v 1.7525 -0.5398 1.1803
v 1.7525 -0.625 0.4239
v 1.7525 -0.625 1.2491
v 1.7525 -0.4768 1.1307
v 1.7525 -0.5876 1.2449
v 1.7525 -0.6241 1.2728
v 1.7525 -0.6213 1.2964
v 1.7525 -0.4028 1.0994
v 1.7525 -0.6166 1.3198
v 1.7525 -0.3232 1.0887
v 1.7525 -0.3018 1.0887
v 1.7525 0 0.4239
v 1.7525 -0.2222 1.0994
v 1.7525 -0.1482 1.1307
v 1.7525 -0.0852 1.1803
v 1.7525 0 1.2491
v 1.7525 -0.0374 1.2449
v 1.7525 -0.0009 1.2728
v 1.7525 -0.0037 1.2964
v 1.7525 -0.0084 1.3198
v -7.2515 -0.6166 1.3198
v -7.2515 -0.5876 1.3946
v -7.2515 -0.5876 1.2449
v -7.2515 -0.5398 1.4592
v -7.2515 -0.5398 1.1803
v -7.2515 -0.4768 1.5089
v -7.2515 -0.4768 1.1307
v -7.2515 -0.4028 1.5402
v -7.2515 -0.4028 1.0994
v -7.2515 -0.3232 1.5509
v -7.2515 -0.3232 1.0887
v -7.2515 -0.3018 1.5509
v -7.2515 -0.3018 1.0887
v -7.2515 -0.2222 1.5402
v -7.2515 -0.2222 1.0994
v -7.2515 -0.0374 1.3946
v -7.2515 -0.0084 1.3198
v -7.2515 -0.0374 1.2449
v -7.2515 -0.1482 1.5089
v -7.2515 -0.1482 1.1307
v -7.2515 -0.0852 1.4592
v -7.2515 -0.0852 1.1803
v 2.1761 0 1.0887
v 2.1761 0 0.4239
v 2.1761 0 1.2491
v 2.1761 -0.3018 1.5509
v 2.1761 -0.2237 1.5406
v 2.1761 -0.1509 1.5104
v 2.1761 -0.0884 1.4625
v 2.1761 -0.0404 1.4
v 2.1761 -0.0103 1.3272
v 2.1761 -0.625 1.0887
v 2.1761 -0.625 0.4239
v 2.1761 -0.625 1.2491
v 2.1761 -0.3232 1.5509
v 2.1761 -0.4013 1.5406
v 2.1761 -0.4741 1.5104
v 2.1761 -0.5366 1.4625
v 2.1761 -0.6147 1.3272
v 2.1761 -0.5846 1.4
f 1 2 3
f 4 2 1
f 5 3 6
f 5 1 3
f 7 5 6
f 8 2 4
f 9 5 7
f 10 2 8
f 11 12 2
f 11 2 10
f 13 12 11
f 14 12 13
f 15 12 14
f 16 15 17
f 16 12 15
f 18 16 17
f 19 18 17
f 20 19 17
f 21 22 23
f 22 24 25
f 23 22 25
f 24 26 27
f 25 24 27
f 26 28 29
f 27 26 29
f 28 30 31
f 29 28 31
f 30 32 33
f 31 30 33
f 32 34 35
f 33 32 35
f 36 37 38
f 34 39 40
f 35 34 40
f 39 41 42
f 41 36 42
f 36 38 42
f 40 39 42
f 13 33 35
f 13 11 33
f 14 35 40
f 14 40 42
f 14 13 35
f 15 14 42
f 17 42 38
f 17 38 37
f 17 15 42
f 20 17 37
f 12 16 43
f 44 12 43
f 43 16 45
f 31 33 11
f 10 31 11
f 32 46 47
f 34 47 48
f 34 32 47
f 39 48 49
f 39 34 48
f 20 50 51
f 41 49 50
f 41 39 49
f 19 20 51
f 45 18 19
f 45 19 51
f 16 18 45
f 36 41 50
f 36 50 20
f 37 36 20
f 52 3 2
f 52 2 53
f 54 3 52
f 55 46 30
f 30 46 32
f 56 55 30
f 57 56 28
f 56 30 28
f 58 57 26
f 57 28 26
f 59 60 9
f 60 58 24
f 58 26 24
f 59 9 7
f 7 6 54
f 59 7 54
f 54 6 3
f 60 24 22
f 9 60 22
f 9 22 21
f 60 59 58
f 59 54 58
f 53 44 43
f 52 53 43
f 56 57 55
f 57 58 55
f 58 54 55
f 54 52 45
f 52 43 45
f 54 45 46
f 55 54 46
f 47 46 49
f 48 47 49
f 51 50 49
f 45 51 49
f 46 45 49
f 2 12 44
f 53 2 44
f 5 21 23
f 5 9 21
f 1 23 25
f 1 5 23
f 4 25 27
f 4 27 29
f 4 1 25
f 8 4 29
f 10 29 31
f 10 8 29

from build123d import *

# Parameters (mm, degrees)
F0_W     = 3.3884318545
F0_H     = 5.3184241988
F1_DEPTH = 5
F2_F1_R  = 2.4142135624
F2_F2_R  = 2.4142135624
F2_F3_R  = 2.4142135624
F2_F4_R  = 2.4142135624
F3_SCALE = 0.125


with BuildPart() as f1:
    # F0 (on Front) → F1 (new body)
    with BuildSketch(Plane.XZ):
        Polygon((17.4084361643, 12.4068003497), (-58.0119900405, 12.4068003497), (-58.0119900405, 8.7094834889), (14.0200043097, 8.7094834889), (17.4084361643, 8.7094834889), align=None)
        with Locations((15.714220237, 6.0502713895)):
            Rectangle(F0_W, F0_H)
    extrude(amount=F1_DEPTH)

    # F2: fillet of radius 2.4142135624 on 4 edges, made by hand

    # F2_f1
    f2_f1_edges = [f1.edges().sort_by_distance(p)[0] for p in [
        (-21.9959928654, 0, 8.7094834889),
    ]]
    fillet(f2_f1_edges, radius=F2_F1_R)

    # F2_f2
    f2_f2_edges = [f1.edges().sort_by_distance(p)[0] for p in [
        (-21.9959928654, -5, 8.7094834889),
    ]]
    fillet(f2_f2_edges, radius=F2_F2_R)

    # F2_f3
    f2_f3_edges = [f1.edges().sort_by_distance(p)[0] for p in [
        (-20.3017769381, 0, 12.4068003497),
    ]]
    fillet(f2_f3_edges, radius=F2_F3_R)

    # F2_f4
    f2_f4_edges = [f1.edges().sort_by_distance(p)[0] for p in [
        (-20.3017769381, -5, 12.4068003497),
    ]]
    fillet(f2_f4_edges, radius=F2_F4_R)


with BuildPart() as f1_1:
    # F3: moved
    add(f1.part.scale(F3_SCALE))


solid = f1_1.part
